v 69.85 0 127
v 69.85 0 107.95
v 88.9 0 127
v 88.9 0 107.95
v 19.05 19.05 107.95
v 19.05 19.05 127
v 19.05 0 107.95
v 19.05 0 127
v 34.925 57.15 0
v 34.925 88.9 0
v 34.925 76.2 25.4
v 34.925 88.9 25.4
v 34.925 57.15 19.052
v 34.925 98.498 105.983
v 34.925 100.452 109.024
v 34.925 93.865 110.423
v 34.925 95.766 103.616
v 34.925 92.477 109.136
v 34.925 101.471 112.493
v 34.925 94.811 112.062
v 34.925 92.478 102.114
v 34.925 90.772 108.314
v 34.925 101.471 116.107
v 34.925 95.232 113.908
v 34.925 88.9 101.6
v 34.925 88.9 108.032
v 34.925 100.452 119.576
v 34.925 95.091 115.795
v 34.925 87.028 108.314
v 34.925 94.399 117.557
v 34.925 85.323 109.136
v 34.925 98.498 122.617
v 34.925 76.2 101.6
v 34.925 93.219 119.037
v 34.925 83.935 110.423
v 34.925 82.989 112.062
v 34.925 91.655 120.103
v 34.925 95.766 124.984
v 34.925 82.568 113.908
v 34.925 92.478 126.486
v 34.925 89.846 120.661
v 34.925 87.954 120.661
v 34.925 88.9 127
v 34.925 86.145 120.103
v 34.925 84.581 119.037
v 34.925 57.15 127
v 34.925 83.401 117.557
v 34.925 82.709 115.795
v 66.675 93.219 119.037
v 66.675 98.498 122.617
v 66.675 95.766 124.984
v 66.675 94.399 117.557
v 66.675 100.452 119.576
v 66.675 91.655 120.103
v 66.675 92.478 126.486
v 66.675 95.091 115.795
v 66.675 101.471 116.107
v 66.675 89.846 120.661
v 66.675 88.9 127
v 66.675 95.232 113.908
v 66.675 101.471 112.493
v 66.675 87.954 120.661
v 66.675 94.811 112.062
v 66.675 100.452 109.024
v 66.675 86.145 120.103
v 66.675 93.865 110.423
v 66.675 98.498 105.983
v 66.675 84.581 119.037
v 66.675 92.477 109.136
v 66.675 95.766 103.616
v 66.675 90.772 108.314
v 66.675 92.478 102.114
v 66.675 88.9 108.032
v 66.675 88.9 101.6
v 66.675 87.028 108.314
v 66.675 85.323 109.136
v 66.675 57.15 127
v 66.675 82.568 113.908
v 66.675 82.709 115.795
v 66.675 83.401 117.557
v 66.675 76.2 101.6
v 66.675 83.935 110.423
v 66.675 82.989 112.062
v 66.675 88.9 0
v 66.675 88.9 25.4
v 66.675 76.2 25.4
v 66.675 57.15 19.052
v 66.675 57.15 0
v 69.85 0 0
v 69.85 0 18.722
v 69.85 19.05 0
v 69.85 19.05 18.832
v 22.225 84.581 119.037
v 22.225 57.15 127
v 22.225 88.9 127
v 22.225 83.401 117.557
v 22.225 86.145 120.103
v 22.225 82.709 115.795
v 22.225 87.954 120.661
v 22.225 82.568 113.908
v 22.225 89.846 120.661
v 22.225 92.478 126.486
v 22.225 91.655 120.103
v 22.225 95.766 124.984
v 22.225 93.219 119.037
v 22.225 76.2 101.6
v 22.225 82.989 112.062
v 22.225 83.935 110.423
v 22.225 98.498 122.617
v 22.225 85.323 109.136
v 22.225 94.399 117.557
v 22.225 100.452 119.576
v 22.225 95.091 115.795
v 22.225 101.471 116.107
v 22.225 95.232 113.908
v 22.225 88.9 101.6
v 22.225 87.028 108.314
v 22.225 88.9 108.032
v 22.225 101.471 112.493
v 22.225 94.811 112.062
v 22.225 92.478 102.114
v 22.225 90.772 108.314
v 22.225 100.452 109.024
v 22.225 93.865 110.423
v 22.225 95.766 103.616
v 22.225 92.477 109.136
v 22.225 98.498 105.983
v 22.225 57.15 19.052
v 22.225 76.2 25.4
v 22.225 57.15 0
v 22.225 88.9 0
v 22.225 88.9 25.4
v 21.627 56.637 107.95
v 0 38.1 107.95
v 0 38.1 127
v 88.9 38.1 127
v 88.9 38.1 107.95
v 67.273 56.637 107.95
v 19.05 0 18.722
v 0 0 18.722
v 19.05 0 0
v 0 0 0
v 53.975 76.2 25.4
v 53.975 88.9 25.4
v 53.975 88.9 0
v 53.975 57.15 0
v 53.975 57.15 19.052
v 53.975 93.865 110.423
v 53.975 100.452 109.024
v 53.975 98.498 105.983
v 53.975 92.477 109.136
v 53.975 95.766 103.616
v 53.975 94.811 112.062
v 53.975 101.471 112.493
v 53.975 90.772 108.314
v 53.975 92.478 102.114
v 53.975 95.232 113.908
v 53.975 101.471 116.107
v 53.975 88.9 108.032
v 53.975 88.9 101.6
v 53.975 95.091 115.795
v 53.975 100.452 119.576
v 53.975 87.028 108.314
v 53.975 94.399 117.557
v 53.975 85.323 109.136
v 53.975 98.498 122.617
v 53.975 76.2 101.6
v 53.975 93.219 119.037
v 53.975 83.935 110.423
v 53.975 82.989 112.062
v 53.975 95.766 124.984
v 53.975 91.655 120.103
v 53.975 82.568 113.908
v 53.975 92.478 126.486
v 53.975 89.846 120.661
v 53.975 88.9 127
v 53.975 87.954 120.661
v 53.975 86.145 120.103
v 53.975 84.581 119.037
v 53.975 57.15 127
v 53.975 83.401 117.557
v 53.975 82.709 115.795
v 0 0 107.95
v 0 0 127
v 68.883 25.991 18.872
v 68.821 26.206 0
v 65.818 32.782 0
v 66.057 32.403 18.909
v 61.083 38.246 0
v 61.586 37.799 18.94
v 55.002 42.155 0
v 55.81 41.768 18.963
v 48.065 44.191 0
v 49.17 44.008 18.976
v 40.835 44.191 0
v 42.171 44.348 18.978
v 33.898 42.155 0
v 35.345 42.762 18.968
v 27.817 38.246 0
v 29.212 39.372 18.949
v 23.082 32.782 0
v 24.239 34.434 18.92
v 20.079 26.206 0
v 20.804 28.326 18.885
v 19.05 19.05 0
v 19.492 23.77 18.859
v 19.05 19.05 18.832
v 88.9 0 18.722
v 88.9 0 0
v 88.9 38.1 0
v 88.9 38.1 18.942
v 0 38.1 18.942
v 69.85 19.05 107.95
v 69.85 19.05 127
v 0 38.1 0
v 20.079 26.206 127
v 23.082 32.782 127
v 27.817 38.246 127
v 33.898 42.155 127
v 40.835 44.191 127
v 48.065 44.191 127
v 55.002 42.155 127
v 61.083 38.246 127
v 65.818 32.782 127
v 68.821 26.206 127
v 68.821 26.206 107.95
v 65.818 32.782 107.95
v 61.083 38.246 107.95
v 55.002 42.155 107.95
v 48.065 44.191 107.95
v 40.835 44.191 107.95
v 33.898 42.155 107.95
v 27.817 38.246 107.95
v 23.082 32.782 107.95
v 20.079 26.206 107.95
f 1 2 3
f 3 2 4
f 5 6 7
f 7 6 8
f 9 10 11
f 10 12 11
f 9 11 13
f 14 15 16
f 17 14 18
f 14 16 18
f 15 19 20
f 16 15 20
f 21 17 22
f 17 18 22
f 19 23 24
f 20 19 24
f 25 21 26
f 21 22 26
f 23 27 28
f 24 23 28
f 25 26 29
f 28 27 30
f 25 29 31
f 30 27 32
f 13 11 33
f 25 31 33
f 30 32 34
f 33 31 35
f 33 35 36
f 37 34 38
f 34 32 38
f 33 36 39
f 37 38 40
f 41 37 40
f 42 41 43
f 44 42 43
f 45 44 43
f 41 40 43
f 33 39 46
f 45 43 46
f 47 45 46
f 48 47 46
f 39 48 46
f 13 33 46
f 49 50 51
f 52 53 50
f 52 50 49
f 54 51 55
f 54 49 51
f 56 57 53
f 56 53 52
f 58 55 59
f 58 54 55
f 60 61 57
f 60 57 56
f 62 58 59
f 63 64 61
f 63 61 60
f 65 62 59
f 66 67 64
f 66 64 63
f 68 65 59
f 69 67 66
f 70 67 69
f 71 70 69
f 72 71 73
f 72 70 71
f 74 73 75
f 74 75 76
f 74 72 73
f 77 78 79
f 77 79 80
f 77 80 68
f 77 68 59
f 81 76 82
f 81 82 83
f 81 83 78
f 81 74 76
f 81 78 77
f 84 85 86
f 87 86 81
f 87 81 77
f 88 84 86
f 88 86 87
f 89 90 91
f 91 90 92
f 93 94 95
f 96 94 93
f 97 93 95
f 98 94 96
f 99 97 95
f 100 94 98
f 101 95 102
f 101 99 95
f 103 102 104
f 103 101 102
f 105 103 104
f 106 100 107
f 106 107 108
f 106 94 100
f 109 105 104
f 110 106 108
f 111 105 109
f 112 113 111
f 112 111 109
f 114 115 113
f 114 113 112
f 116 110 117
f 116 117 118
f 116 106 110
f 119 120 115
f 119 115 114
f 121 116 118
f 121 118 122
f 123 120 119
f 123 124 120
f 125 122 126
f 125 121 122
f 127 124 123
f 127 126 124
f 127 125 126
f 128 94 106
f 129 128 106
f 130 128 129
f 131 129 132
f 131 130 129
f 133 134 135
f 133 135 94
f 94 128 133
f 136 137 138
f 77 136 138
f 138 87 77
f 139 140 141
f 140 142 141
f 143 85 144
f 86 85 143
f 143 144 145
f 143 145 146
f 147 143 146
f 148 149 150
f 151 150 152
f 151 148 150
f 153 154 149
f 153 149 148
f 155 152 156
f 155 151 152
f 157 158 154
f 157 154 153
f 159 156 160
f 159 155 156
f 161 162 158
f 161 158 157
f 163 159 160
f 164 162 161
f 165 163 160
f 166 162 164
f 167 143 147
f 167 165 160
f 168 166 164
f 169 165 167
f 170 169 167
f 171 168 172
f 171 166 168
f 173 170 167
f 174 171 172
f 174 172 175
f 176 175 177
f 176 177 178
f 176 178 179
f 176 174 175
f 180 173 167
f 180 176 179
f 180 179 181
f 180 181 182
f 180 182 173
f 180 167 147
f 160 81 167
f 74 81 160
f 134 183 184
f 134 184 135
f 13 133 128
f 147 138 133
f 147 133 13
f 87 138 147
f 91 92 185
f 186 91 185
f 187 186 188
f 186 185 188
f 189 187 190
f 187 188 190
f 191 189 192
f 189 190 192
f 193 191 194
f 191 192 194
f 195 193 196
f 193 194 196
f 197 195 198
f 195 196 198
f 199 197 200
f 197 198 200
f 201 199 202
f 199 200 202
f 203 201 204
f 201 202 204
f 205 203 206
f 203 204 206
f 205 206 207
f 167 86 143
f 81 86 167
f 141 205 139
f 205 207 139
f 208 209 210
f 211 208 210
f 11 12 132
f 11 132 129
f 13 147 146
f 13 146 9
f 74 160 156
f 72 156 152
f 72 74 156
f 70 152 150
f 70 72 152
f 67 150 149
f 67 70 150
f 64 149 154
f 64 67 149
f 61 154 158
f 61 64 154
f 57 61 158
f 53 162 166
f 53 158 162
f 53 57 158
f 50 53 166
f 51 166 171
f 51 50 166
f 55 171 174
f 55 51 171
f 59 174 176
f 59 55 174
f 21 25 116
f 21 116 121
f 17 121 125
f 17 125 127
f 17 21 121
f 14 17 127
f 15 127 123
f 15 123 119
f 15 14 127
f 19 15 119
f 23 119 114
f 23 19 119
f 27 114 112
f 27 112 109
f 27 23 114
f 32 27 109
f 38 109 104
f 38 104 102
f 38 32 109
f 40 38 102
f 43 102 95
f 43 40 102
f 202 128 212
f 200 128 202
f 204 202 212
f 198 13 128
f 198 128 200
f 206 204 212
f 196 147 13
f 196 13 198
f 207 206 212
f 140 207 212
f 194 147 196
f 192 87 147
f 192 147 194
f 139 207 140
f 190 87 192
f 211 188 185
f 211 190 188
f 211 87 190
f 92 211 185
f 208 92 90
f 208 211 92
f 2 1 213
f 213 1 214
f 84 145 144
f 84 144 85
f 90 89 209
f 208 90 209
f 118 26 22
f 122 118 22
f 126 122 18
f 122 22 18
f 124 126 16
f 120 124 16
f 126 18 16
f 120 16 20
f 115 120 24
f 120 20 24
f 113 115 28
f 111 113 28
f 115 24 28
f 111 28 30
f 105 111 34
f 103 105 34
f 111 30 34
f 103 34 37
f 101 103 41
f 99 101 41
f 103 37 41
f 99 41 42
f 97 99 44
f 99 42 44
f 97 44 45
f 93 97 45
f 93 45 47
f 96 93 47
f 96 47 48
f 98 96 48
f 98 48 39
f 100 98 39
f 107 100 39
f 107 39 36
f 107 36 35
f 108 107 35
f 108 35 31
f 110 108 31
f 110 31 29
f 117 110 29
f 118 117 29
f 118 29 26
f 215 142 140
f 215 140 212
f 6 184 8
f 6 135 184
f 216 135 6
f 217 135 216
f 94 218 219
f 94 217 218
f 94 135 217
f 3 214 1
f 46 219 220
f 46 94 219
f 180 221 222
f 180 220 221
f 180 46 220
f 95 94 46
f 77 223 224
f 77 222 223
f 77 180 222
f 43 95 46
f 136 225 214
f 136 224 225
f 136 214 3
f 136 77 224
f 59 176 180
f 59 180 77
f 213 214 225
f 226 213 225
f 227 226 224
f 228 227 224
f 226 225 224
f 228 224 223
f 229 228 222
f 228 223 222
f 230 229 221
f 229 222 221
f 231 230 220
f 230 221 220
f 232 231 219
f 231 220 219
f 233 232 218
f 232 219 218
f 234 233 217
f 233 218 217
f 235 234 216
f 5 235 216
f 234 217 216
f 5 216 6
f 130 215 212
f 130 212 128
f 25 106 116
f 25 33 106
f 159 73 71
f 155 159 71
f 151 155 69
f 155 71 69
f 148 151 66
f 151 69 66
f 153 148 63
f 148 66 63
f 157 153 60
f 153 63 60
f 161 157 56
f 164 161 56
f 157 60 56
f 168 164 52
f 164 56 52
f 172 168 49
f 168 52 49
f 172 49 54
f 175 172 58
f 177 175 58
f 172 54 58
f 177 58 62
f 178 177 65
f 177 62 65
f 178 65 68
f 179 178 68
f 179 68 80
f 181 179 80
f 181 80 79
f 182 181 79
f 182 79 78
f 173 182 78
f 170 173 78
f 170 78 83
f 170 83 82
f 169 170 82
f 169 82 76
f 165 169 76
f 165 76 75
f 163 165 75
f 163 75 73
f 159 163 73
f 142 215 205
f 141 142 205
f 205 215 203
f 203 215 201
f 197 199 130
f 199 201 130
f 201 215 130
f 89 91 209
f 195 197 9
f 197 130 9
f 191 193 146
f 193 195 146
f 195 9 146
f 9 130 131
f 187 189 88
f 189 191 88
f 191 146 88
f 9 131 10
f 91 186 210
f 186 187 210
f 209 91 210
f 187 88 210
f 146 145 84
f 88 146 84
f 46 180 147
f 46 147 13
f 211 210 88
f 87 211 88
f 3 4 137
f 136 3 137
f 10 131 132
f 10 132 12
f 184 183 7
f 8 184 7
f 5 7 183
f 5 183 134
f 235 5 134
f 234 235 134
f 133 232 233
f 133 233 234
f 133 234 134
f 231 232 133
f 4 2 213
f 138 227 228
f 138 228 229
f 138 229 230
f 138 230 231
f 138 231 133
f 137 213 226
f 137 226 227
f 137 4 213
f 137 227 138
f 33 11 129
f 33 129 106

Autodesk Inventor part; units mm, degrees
ref_plane "YZ Plane" through (0, 0, 0) normal (1, 0, 0) x (0, 1, 0)
ref_plane "XZ Plane" through (0, 0, 0) normal (0, 1, 0) x (-1, 0, 0)
ref_plane "XY Plane" through (0, 0, 0) normal (0, 0, 1) x (1, 0, 0)
sketch "Sketch1" plane through (0, 0, 0) normal (0, 0, 1) x (1, 0, 0)
  line L0 (0, 0) -> (88.9, 0)
  line L1 (22.225, 57.15) -> (22.225, 88.9)
  line L2 (22.225, 88.9) -> (66.675, 88.9)
  line L3 (66.675, 88.9) -> (66.675, 57.15)
  line L4 (88.9, 0) -> (88.9, 38.1)
  line L5 (88.9, 38.1) -> (66.675, 57.15)
  line L6 (0, 0) -> (0, 38.1)
  line L7 (0, 38.1) -> (22.225, 57.15)
  line L8 (22.225, 57.15) -> (66.675, 57.15)
  dimension "d4" = 44.45
  dimension "d12" = 38.1
  dimension "d13" = 38.1
  dimension "d14" = 44.45
  dimension "d15" = 31.75
  dimension "d16" = 88.9
extrude "Extrusion1" add sketch "Sketch1" along normal blind 127
sketch "Sketch2" plane through (0, 0, 127) normal (0, 0, 1) x (1, 0, 0)
  line L0 (0, 0) -> (88.9, 0) projected
  line L1 (44.45, 0) -> (44.45, 19.05)
  circle A0 centre (44.45, 19.05) radius 25.4
  line L2 (19.05, 19.05) -> (19.05, 0)
  line L3 (69.85, 0) -> (69.85, 19.05)
  dimension "d8" = 19.05
  dimension "d9" = 50.8
extrude "Extrusion2" cut sketch "Sketch2" against normal through all
sketch "Sketch3" plane through (0, 0, 127) normal (0, 0, 1) x (1, 0, 0)
  line L0 (22.225, 88.9) -> (34.925, 88.9)
  line L1 (66.675, 88.9) -> (22.225, 88.9) projected
  line L2 (34.925, 88.9) -> (53.975, 88.9)
  line L3 (53.975, 88.9) -> (66.675, 88.9)
  line L4 (34.925, 88.9) -> (34.925, 57.15)
  line L5 (53.975, 88.9) -> (53.975, 57.15)
  line L6 (53.975, 57.15) -> (34.925, 57.15)
  point P0 (0, 0)
  point P1 (22.225, 57.15)
  point P2 (66.675, 57.15)
  dimension "d17" = 12.7
  dimension "d18" = 19.05
extrude "Extrusion3" cut sketch "Sketch3" against normal through all
sketch "Sketch4" plane through (88.9, 0, 0) normal (1, 0, 0) x (0, 0, -1)
  line L0 (-127, 0) -> (-107.95, 0)
  line L1 (0, 0) -> (-127, 0) projected
  line L2 (-107.95, 0) -> (-107.95, 56.6372)
  line L3 (-107.95, 56.6372) -> (-19.0515, 57.15)
  line L4 (0, 57.15) -> (-127, 57.15) projected
  line L5 (-19.0515, 57.15) -> (-18.7218, 0)
  dimension "d21" = 19.05
  dimension "d22" = 88.9
extrude "Extrusion4" cut sketch "Sketch4" against normal through all
sketch "Sketch5" plane through (66.675, 57.15, 0) normal (1, 0, 0) x (0, 0, -1)
  line L0 (0, 31.75) -> (-25.4, 31.75)
  line L1 (0, 31.75) -> (-127, 31.75) projected
  line L2 (-25.4, 31.75) -> (-25.4, 19.05)
  line L3 (-25.4, 19.05) -> (-101.6, 19.05)
  line L4 (-101.6, 19.05) -> (-101.6, 31.75)
  point P0 (0, -57.15)
  dimension "d25" = 25.4
  dimension "d26" = 12.7
  dimension "d27" = 76.2
extrude "Extrusion5" cut sketch "Sketch5" against normal through all
sketch "Sketch6" plane through (66.675, 57.15, 0) normal (1, 0, 0) x (0, 0, -1)
  line L0 (-101.6, 31.75) -> (-127, 31.75) projected
  circle A0 centre (-114.3, 31.75) radius 12.7
  point P0 (0, -57.15)
extrude "Extrusion6" add sketch "Sketch6" against normal blind 44.45
sketch "Sketch7" plane through (0, 0, 127) normal (0, 0, 1) x (1, 0, 0)
  line L0 (66.675, 101.6) -> (22.225, 101.6) projected
  line L1 (34.925, 57.15) -> (53.975, 57.15)
  line L2 (53.975, 57.15) -> (53.975, 101.6)
  line L3 (53.975, 101.6) -> (34.925, 101.6)
  line L4 (34.925, 101.6) -> (34.925, 57.15)
  point P0 (0, 0)
extrude "Extrusion7" cut sketch "Sketch7" against normal blind 44.45
sketch "Sketch8" plane through (66.675, 57.15, 0) normal (1, 0, 0) x (0, 0, -1)
  line L0 (-127, 31.75) -> (-101.7646, 31.75)
  circle A0 centre (-114.3823, 31.75) radius 6.35
  point P0 (0, -57.15)
  dimension "d34" = 12.7
extrude "Extrusion8" cut sketch "Sketch8" against normal through all
properties part number "3-4"
